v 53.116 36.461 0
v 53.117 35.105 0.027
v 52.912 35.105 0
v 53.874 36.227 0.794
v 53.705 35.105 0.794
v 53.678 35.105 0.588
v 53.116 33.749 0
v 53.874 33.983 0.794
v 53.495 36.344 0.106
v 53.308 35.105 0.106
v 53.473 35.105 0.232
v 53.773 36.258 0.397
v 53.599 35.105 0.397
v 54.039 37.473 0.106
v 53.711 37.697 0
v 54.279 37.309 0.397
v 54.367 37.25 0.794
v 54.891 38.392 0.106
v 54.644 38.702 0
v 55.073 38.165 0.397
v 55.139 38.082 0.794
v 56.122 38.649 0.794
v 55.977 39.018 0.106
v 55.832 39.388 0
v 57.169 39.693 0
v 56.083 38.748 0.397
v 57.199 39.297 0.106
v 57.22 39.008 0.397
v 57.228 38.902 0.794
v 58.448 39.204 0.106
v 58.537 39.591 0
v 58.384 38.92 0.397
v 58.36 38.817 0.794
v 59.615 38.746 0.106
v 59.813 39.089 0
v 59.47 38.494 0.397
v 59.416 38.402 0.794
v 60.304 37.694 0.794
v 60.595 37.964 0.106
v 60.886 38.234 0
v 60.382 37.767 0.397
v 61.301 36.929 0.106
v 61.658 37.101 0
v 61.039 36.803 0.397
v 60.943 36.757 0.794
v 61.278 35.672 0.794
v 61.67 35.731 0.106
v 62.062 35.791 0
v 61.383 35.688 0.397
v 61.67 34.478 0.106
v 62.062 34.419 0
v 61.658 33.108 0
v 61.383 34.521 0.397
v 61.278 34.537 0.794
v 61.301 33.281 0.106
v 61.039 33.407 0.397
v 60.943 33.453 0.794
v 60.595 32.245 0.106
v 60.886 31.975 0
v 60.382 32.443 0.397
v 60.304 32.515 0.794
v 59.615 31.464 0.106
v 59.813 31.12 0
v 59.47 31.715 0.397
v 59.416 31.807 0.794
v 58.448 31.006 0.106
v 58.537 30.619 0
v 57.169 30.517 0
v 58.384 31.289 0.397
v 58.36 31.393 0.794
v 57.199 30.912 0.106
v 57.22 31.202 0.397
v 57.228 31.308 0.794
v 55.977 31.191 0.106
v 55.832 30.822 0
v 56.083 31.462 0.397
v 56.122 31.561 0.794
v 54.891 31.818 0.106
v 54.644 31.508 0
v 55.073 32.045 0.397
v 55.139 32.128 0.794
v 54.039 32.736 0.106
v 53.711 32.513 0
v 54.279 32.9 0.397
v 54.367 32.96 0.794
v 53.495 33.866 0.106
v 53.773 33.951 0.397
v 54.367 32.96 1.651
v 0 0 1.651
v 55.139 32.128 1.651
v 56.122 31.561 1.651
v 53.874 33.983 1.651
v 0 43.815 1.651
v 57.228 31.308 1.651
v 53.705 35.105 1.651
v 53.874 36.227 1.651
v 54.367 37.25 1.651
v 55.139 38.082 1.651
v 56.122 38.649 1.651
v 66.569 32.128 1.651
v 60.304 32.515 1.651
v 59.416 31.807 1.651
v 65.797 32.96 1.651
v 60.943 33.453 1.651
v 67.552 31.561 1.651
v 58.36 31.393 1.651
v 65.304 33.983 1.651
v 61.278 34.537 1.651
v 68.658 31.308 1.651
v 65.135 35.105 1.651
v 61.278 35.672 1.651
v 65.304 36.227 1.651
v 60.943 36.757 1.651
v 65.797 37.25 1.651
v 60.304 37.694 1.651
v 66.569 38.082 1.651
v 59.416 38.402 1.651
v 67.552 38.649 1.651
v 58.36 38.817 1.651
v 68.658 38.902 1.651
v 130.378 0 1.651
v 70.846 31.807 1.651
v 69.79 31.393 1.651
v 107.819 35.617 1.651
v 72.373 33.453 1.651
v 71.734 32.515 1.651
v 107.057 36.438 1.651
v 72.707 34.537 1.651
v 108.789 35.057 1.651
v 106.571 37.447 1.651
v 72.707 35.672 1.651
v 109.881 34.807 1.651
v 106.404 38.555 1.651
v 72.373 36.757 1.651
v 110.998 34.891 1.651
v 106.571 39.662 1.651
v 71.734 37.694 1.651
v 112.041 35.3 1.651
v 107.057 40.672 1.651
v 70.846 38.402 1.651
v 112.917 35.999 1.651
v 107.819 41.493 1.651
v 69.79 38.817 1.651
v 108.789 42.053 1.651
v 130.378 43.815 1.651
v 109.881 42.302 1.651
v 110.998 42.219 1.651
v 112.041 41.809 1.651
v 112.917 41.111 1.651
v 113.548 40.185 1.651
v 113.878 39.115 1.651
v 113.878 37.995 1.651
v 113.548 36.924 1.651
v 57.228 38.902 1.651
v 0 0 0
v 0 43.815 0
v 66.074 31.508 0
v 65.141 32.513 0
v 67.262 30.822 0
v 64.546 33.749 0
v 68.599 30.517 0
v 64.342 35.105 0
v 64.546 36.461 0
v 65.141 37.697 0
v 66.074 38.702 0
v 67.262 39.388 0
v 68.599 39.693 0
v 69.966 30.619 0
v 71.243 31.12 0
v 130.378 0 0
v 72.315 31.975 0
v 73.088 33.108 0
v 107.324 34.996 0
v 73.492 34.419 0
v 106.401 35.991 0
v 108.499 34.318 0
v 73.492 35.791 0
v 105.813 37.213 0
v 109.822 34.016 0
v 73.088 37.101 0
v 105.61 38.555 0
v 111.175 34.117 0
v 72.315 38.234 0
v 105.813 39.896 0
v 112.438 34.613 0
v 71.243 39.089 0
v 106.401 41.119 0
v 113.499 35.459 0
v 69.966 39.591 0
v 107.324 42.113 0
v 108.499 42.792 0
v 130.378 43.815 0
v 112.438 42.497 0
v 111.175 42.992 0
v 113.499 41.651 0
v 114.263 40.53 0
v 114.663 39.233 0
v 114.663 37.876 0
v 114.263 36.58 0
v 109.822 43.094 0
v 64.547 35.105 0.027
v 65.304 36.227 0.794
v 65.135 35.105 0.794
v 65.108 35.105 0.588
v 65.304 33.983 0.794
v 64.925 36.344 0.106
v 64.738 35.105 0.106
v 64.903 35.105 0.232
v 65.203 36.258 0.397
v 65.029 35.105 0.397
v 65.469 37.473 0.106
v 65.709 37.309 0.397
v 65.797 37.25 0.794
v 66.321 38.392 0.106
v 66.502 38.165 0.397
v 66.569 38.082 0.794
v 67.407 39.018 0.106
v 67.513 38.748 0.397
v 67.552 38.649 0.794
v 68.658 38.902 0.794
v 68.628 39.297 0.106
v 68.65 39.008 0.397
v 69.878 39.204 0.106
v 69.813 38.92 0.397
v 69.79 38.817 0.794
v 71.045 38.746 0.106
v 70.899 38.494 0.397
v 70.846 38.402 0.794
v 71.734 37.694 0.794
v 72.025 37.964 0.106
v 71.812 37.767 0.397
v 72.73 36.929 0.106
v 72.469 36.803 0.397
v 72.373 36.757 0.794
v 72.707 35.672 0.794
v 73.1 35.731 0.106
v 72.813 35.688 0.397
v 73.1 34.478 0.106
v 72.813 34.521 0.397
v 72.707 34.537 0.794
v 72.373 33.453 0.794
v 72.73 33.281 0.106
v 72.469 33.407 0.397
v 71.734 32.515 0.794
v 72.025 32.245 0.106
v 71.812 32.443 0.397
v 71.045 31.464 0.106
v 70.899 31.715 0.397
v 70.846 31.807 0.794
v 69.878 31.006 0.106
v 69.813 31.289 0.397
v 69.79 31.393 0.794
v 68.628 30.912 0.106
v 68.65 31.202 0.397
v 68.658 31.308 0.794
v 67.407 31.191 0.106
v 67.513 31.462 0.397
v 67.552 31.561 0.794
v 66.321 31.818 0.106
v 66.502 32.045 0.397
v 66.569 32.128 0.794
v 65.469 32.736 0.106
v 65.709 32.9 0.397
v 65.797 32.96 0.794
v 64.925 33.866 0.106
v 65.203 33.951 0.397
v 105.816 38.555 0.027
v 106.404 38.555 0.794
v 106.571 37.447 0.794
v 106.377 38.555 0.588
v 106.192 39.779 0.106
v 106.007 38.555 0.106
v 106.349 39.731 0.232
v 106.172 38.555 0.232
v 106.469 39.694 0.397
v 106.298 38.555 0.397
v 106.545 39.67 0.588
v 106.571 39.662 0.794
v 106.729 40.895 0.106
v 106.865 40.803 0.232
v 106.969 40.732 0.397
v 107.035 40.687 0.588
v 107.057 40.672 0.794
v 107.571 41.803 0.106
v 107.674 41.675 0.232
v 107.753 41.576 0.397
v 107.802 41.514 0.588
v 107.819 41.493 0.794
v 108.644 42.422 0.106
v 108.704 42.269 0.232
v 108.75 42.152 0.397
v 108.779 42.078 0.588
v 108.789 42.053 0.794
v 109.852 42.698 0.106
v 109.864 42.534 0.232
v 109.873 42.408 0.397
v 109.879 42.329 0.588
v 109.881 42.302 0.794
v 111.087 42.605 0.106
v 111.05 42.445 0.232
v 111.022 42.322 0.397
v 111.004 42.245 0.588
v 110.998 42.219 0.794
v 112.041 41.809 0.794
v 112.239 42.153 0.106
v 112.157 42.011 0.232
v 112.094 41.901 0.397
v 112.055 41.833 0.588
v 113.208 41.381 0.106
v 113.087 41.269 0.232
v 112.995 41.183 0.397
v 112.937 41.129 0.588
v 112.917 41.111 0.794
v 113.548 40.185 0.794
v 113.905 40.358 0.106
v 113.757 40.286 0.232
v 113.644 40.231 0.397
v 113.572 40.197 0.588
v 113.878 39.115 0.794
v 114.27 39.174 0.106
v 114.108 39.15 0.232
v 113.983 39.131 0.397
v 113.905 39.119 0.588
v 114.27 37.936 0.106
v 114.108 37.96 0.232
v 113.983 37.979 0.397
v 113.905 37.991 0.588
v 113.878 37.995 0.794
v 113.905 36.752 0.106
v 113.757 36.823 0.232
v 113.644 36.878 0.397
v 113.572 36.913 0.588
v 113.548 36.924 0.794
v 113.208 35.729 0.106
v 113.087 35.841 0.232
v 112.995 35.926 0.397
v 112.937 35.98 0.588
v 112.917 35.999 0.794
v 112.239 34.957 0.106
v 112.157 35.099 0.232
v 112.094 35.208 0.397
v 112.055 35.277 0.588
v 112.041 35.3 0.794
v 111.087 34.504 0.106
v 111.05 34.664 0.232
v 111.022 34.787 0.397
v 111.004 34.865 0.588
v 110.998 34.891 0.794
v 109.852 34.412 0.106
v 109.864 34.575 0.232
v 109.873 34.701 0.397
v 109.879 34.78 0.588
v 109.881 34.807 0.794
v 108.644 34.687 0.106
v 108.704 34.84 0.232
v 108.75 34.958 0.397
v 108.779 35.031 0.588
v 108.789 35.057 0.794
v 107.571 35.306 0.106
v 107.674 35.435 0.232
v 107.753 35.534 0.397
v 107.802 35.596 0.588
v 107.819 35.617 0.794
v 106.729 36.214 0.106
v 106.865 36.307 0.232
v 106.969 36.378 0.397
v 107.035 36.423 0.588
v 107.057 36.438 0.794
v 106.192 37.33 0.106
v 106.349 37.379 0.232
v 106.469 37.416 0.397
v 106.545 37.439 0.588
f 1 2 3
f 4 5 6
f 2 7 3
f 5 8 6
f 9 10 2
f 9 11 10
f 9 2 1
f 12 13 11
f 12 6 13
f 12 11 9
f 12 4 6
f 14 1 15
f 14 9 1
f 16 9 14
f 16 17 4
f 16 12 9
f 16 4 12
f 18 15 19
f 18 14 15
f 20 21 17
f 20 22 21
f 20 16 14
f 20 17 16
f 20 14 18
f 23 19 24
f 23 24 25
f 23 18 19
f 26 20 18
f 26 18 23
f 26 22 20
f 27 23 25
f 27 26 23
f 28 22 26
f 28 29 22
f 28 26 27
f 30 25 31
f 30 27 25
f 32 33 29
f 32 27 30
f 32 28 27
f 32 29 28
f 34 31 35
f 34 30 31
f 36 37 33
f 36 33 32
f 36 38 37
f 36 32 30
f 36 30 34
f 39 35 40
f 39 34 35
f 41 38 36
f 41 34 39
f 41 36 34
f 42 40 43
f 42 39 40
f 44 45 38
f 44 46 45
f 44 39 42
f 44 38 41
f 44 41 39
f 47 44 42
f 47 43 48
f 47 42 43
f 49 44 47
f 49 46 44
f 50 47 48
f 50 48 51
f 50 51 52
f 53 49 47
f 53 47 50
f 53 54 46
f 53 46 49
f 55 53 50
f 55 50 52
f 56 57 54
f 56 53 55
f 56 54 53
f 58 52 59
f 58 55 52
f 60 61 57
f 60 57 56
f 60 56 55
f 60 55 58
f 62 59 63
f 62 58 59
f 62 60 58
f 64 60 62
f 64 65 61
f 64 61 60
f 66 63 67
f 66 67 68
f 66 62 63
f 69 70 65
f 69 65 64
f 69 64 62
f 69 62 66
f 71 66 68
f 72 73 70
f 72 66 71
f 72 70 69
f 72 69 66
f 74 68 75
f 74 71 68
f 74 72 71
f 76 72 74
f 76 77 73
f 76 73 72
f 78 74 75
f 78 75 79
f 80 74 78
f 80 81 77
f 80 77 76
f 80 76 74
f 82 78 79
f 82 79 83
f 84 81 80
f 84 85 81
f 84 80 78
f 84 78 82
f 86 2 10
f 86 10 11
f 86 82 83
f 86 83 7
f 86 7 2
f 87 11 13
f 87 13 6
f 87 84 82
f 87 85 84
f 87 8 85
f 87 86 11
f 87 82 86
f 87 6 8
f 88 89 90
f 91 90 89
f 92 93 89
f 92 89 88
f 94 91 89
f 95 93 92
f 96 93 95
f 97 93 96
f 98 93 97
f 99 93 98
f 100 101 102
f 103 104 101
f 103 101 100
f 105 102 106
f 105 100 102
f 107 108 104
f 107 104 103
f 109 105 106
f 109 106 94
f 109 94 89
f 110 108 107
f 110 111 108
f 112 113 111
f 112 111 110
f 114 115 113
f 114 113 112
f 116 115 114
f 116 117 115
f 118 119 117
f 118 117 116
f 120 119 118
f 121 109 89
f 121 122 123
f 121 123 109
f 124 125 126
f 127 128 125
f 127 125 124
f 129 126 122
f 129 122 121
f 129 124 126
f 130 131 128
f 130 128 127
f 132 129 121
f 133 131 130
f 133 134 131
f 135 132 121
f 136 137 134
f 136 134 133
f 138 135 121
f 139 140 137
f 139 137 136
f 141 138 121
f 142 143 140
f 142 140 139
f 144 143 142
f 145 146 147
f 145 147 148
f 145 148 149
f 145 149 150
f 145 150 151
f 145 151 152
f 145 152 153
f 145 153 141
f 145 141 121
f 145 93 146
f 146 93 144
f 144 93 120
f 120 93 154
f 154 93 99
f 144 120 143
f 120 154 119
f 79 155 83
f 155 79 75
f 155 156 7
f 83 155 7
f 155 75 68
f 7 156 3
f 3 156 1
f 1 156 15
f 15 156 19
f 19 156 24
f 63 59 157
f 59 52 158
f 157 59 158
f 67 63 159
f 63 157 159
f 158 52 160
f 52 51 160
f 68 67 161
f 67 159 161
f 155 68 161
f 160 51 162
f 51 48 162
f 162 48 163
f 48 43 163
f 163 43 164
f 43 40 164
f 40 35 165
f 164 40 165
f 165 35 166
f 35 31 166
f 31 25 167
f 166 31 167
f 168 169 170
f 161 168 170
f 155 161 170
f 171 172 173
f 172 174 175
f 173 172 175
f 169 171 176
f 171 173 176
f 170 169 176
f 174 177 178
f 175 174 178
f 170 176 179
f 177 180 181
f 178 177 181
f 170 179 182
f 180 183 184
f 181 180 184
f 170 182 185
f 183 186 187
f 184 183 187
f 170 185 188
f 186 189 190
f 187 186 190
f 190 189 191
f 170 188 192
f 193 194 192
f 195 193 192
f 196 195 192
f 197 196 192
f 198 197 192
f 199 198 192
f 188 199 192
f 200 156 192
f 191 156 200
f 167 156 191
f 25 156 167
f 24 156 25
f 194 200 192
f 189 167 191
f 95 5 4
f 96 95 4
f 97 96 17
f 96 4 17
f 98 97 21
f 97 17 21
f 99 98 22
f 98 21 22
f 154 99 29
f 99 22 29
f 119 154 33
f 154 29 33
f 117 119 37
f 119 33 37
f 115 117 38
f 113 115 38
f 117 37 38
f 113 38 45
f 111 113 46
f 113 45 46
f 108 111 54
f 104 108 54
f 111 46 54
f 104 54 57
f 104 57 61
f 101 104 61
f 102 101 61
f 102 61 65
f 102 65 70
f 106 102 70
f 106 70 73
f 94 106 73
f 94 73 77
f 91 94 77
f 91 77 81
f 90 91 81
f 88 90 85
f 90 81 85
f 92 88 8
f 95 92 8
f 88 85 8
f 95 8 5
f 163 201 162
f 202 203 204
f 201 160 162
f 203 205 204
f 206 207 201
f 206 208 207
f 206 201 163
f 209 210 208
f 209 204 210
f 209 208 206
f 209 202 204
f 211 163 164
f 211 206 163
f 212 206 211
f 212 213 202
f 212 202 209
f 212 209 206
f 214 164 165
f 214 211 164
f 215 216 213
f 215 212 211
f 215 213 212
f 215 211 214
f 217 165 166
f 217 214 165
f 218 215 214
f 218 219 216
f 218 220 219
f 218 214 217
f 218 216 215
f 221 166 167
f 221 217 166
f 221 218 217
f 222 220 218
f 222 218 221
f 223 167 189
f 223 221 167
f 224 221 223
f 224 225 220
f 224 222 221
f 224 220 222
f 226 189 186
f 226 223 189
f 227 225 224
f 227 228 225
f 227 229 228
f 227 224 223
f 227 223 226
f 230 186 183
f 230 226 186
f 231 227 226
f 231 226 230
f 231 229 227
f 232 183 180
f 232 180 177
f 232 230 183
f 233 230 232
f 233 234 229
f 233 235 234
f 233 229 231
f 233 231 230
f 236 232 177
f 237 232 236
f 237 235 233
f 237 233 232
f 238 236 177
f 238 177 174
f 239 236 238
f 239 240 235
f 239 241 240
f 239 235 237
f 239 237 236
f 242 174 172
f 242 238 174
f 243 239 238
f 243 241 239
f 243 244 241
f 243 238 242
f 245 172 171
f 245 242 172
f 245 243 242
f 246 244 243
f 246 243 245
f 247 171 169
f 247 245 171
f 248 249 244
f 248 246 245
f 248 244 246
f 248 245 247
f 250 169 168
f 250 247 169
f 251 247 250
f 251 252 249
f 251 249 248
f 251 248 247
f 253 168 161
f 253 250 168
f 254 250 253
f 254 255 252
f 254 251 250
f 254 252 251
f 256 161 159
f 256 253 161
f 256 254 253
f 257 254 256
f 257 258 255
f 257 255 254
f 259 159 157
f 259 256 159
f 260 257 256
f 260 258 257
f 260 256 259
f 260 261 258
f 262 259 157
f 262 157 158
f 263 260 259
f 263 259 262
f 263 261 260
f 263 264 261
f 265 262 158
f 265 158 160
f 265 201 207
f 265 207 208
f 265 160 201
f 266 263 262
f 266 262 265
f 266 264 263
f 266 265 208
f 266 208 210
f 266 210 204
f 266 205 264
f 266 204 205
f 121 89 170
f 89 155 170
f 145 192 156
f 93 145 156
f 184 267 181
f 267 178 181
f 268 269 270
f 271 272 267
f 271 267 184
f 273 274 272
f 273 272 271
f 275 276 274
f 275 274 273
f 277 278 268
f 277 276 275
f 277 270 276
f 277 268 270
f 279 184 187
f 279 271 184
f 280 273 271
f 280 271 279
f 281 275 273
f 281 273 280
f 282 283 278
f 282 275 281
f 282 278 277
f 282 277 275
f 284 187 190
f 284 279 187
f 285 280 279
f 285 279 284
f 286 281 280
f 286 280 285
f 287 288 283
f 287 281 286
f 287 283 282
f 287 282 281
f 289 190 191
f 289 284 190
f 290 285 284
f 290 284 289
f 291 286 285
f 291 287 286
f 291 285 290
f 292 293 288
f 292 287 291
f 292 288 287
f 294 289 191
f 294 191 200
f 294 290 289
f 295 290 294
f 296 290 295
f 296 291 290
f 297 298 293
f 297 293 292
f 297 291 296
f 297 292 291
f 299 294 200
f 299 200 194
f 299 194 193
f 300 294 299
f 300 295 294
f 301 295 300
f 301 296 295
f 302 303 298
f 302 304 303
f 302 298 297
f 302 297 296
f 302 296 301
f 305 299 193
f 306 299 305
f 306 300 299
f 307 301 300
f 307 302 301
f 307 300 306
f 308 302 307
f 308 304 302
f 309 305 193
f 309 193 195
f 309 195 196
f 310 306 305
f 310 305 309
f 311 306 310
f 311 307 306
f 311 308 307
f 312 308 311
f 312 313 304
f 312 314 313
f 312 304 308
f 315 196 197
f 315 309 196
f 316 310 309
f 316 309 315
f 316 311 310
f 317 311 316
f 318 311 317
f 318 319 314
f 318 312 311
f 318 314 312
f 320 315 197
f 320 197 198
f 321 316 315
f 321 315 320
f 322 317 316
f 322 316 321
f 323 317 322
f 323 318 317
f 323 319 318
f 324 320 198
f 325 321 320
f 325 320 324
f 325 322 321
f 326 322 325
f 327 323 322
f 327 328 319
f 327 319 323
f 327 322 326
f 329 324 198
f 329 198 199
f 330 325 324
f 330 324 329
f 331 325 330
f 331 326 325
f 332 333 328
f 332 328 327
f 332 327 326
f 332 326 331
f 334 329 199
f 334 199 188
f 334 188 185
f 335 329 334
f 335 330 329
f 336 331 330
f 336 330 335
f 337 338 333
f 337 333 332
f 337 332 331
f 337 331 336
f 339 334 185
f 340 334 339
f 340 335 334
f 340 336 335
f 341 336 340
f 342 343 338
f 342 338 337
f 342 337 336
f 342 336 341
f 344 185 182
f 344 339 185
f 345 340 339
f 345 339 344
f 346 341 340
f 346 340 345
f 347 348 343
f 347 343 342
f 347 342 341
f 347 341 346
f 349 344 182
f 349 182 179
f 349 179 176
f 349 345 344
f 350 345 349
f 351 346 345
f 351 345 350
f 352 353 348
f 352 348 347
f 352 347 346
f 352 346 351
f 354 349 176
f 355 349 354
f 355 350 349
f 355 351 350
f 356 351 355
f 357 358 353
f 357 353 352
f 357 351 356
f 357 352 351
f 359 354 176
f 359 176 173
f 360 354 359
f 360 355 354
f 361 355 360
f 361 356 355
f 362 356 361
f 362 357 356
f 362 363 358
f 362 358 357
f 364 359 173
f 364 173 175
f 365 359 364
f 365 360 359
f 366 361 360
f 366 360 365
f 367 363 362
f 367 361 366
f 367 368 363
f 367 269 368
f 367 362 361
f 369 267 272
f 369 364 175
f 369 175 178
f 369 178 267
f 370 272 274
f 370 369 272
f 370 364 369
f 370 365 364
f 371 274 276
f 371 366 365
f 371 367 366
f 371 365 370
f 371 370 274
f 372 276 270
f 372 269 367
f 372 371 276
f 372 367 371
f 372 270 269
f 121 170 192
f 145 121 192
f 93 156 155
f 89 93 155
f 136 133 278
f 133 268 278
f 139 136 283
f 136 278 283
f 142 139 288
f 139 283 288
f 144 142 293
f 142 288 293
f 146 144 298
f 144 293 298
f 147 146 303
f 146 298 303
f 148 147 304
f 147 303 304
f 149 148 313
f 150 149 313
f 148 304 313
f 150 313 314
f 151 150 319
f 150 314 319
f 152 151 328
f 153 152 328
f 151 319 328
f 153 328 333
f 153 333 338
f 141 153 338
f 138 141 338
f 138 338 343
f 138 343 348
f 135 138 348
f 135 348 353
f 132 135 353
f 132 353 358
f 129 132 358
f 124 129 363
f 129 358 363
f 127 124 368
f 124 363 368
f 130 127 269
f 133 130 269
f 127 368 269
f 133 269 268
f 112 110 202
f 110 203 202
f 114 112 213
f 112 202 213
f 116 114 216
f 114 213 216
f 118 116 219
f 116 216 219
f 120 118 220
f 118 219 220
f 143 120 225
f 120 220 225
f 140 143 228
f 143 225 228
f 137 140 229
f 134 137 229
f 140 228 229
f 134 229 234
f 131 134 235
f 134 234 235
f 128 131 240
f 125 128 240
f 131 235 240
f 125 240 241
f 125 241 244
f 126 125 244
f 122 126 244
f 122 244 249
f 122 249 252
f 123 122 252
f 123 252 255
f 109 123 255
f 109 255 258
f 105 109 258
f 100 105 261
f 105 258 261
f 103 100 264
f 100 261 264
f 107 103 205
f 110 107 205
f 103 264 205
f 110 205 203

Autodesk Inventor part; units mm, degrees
ref_plane "YZ Plane" through (0, 0, 0) normal (1, 0, 0) x (0, 1, 0)
ref_plane "XZ Plane" through (0, 0, 0) normal (0, 1, 0) x (-1, 0, 0)
ref_plane "XY Plane" through (0, 0, 0) normal (0, 0, 1) x (1, 0, 0)
sketch "Sketch1" plane through (0, 0, 0) normal (0, 0, 1) x (1, 0, 0)
  line L0 (0, 0) -> (130.3782, 0)
  line L1 (130.3782, 0) -> (130.3782, 43.815)
  line L2 (130.3782, 43.815) -> (0, 43.815)
  line L3 (0, 43.815) -> (0, 0)
  dimension "d0" = 130.3782
  dimension "d1" = 43.815
extrude "Extrusion1" add sketch "Sketch1" along normal blind 1.651
sketch "Sketch2" plane through (0, 0, 0) normal (0, 0, -1) x (-1, 0, 0)
  circle A0 centre (-110.162, 38.5548) radius 3.25 projected
  circle A1 centre (-68.9426, 35.1048) radius 1.75 projected
  circle A2 centre (-57.5127, 35.1048) radius 1.75 projected
  circle A3 centre (-110.162, 38.5548) radius 3.758
  circle A4 centre (-68.9426, 35.1048) radius 3.8074
  circle A5 centre (-57.5127, 35.1048) radius 3.8074
  point P0 (0, 0)
  dimension "d4" = 0.508
  dimension "d5" = 3.5
  dimension "d6" = 2.0574
  dimension "d7" = 2.0574
extrude "Extrusion2" cut sketch "Sketch2" against normal blind 1.651 contours A0 | A1 | A2 | A3 | A4 | A5
fillet "Fillet1" radius 0.7937 3 edges at (113.92, 38.5548, 0) (72.75, 35.1048, 0) (61.3201, 35.1048, 0)
properties part number "back_plate"
